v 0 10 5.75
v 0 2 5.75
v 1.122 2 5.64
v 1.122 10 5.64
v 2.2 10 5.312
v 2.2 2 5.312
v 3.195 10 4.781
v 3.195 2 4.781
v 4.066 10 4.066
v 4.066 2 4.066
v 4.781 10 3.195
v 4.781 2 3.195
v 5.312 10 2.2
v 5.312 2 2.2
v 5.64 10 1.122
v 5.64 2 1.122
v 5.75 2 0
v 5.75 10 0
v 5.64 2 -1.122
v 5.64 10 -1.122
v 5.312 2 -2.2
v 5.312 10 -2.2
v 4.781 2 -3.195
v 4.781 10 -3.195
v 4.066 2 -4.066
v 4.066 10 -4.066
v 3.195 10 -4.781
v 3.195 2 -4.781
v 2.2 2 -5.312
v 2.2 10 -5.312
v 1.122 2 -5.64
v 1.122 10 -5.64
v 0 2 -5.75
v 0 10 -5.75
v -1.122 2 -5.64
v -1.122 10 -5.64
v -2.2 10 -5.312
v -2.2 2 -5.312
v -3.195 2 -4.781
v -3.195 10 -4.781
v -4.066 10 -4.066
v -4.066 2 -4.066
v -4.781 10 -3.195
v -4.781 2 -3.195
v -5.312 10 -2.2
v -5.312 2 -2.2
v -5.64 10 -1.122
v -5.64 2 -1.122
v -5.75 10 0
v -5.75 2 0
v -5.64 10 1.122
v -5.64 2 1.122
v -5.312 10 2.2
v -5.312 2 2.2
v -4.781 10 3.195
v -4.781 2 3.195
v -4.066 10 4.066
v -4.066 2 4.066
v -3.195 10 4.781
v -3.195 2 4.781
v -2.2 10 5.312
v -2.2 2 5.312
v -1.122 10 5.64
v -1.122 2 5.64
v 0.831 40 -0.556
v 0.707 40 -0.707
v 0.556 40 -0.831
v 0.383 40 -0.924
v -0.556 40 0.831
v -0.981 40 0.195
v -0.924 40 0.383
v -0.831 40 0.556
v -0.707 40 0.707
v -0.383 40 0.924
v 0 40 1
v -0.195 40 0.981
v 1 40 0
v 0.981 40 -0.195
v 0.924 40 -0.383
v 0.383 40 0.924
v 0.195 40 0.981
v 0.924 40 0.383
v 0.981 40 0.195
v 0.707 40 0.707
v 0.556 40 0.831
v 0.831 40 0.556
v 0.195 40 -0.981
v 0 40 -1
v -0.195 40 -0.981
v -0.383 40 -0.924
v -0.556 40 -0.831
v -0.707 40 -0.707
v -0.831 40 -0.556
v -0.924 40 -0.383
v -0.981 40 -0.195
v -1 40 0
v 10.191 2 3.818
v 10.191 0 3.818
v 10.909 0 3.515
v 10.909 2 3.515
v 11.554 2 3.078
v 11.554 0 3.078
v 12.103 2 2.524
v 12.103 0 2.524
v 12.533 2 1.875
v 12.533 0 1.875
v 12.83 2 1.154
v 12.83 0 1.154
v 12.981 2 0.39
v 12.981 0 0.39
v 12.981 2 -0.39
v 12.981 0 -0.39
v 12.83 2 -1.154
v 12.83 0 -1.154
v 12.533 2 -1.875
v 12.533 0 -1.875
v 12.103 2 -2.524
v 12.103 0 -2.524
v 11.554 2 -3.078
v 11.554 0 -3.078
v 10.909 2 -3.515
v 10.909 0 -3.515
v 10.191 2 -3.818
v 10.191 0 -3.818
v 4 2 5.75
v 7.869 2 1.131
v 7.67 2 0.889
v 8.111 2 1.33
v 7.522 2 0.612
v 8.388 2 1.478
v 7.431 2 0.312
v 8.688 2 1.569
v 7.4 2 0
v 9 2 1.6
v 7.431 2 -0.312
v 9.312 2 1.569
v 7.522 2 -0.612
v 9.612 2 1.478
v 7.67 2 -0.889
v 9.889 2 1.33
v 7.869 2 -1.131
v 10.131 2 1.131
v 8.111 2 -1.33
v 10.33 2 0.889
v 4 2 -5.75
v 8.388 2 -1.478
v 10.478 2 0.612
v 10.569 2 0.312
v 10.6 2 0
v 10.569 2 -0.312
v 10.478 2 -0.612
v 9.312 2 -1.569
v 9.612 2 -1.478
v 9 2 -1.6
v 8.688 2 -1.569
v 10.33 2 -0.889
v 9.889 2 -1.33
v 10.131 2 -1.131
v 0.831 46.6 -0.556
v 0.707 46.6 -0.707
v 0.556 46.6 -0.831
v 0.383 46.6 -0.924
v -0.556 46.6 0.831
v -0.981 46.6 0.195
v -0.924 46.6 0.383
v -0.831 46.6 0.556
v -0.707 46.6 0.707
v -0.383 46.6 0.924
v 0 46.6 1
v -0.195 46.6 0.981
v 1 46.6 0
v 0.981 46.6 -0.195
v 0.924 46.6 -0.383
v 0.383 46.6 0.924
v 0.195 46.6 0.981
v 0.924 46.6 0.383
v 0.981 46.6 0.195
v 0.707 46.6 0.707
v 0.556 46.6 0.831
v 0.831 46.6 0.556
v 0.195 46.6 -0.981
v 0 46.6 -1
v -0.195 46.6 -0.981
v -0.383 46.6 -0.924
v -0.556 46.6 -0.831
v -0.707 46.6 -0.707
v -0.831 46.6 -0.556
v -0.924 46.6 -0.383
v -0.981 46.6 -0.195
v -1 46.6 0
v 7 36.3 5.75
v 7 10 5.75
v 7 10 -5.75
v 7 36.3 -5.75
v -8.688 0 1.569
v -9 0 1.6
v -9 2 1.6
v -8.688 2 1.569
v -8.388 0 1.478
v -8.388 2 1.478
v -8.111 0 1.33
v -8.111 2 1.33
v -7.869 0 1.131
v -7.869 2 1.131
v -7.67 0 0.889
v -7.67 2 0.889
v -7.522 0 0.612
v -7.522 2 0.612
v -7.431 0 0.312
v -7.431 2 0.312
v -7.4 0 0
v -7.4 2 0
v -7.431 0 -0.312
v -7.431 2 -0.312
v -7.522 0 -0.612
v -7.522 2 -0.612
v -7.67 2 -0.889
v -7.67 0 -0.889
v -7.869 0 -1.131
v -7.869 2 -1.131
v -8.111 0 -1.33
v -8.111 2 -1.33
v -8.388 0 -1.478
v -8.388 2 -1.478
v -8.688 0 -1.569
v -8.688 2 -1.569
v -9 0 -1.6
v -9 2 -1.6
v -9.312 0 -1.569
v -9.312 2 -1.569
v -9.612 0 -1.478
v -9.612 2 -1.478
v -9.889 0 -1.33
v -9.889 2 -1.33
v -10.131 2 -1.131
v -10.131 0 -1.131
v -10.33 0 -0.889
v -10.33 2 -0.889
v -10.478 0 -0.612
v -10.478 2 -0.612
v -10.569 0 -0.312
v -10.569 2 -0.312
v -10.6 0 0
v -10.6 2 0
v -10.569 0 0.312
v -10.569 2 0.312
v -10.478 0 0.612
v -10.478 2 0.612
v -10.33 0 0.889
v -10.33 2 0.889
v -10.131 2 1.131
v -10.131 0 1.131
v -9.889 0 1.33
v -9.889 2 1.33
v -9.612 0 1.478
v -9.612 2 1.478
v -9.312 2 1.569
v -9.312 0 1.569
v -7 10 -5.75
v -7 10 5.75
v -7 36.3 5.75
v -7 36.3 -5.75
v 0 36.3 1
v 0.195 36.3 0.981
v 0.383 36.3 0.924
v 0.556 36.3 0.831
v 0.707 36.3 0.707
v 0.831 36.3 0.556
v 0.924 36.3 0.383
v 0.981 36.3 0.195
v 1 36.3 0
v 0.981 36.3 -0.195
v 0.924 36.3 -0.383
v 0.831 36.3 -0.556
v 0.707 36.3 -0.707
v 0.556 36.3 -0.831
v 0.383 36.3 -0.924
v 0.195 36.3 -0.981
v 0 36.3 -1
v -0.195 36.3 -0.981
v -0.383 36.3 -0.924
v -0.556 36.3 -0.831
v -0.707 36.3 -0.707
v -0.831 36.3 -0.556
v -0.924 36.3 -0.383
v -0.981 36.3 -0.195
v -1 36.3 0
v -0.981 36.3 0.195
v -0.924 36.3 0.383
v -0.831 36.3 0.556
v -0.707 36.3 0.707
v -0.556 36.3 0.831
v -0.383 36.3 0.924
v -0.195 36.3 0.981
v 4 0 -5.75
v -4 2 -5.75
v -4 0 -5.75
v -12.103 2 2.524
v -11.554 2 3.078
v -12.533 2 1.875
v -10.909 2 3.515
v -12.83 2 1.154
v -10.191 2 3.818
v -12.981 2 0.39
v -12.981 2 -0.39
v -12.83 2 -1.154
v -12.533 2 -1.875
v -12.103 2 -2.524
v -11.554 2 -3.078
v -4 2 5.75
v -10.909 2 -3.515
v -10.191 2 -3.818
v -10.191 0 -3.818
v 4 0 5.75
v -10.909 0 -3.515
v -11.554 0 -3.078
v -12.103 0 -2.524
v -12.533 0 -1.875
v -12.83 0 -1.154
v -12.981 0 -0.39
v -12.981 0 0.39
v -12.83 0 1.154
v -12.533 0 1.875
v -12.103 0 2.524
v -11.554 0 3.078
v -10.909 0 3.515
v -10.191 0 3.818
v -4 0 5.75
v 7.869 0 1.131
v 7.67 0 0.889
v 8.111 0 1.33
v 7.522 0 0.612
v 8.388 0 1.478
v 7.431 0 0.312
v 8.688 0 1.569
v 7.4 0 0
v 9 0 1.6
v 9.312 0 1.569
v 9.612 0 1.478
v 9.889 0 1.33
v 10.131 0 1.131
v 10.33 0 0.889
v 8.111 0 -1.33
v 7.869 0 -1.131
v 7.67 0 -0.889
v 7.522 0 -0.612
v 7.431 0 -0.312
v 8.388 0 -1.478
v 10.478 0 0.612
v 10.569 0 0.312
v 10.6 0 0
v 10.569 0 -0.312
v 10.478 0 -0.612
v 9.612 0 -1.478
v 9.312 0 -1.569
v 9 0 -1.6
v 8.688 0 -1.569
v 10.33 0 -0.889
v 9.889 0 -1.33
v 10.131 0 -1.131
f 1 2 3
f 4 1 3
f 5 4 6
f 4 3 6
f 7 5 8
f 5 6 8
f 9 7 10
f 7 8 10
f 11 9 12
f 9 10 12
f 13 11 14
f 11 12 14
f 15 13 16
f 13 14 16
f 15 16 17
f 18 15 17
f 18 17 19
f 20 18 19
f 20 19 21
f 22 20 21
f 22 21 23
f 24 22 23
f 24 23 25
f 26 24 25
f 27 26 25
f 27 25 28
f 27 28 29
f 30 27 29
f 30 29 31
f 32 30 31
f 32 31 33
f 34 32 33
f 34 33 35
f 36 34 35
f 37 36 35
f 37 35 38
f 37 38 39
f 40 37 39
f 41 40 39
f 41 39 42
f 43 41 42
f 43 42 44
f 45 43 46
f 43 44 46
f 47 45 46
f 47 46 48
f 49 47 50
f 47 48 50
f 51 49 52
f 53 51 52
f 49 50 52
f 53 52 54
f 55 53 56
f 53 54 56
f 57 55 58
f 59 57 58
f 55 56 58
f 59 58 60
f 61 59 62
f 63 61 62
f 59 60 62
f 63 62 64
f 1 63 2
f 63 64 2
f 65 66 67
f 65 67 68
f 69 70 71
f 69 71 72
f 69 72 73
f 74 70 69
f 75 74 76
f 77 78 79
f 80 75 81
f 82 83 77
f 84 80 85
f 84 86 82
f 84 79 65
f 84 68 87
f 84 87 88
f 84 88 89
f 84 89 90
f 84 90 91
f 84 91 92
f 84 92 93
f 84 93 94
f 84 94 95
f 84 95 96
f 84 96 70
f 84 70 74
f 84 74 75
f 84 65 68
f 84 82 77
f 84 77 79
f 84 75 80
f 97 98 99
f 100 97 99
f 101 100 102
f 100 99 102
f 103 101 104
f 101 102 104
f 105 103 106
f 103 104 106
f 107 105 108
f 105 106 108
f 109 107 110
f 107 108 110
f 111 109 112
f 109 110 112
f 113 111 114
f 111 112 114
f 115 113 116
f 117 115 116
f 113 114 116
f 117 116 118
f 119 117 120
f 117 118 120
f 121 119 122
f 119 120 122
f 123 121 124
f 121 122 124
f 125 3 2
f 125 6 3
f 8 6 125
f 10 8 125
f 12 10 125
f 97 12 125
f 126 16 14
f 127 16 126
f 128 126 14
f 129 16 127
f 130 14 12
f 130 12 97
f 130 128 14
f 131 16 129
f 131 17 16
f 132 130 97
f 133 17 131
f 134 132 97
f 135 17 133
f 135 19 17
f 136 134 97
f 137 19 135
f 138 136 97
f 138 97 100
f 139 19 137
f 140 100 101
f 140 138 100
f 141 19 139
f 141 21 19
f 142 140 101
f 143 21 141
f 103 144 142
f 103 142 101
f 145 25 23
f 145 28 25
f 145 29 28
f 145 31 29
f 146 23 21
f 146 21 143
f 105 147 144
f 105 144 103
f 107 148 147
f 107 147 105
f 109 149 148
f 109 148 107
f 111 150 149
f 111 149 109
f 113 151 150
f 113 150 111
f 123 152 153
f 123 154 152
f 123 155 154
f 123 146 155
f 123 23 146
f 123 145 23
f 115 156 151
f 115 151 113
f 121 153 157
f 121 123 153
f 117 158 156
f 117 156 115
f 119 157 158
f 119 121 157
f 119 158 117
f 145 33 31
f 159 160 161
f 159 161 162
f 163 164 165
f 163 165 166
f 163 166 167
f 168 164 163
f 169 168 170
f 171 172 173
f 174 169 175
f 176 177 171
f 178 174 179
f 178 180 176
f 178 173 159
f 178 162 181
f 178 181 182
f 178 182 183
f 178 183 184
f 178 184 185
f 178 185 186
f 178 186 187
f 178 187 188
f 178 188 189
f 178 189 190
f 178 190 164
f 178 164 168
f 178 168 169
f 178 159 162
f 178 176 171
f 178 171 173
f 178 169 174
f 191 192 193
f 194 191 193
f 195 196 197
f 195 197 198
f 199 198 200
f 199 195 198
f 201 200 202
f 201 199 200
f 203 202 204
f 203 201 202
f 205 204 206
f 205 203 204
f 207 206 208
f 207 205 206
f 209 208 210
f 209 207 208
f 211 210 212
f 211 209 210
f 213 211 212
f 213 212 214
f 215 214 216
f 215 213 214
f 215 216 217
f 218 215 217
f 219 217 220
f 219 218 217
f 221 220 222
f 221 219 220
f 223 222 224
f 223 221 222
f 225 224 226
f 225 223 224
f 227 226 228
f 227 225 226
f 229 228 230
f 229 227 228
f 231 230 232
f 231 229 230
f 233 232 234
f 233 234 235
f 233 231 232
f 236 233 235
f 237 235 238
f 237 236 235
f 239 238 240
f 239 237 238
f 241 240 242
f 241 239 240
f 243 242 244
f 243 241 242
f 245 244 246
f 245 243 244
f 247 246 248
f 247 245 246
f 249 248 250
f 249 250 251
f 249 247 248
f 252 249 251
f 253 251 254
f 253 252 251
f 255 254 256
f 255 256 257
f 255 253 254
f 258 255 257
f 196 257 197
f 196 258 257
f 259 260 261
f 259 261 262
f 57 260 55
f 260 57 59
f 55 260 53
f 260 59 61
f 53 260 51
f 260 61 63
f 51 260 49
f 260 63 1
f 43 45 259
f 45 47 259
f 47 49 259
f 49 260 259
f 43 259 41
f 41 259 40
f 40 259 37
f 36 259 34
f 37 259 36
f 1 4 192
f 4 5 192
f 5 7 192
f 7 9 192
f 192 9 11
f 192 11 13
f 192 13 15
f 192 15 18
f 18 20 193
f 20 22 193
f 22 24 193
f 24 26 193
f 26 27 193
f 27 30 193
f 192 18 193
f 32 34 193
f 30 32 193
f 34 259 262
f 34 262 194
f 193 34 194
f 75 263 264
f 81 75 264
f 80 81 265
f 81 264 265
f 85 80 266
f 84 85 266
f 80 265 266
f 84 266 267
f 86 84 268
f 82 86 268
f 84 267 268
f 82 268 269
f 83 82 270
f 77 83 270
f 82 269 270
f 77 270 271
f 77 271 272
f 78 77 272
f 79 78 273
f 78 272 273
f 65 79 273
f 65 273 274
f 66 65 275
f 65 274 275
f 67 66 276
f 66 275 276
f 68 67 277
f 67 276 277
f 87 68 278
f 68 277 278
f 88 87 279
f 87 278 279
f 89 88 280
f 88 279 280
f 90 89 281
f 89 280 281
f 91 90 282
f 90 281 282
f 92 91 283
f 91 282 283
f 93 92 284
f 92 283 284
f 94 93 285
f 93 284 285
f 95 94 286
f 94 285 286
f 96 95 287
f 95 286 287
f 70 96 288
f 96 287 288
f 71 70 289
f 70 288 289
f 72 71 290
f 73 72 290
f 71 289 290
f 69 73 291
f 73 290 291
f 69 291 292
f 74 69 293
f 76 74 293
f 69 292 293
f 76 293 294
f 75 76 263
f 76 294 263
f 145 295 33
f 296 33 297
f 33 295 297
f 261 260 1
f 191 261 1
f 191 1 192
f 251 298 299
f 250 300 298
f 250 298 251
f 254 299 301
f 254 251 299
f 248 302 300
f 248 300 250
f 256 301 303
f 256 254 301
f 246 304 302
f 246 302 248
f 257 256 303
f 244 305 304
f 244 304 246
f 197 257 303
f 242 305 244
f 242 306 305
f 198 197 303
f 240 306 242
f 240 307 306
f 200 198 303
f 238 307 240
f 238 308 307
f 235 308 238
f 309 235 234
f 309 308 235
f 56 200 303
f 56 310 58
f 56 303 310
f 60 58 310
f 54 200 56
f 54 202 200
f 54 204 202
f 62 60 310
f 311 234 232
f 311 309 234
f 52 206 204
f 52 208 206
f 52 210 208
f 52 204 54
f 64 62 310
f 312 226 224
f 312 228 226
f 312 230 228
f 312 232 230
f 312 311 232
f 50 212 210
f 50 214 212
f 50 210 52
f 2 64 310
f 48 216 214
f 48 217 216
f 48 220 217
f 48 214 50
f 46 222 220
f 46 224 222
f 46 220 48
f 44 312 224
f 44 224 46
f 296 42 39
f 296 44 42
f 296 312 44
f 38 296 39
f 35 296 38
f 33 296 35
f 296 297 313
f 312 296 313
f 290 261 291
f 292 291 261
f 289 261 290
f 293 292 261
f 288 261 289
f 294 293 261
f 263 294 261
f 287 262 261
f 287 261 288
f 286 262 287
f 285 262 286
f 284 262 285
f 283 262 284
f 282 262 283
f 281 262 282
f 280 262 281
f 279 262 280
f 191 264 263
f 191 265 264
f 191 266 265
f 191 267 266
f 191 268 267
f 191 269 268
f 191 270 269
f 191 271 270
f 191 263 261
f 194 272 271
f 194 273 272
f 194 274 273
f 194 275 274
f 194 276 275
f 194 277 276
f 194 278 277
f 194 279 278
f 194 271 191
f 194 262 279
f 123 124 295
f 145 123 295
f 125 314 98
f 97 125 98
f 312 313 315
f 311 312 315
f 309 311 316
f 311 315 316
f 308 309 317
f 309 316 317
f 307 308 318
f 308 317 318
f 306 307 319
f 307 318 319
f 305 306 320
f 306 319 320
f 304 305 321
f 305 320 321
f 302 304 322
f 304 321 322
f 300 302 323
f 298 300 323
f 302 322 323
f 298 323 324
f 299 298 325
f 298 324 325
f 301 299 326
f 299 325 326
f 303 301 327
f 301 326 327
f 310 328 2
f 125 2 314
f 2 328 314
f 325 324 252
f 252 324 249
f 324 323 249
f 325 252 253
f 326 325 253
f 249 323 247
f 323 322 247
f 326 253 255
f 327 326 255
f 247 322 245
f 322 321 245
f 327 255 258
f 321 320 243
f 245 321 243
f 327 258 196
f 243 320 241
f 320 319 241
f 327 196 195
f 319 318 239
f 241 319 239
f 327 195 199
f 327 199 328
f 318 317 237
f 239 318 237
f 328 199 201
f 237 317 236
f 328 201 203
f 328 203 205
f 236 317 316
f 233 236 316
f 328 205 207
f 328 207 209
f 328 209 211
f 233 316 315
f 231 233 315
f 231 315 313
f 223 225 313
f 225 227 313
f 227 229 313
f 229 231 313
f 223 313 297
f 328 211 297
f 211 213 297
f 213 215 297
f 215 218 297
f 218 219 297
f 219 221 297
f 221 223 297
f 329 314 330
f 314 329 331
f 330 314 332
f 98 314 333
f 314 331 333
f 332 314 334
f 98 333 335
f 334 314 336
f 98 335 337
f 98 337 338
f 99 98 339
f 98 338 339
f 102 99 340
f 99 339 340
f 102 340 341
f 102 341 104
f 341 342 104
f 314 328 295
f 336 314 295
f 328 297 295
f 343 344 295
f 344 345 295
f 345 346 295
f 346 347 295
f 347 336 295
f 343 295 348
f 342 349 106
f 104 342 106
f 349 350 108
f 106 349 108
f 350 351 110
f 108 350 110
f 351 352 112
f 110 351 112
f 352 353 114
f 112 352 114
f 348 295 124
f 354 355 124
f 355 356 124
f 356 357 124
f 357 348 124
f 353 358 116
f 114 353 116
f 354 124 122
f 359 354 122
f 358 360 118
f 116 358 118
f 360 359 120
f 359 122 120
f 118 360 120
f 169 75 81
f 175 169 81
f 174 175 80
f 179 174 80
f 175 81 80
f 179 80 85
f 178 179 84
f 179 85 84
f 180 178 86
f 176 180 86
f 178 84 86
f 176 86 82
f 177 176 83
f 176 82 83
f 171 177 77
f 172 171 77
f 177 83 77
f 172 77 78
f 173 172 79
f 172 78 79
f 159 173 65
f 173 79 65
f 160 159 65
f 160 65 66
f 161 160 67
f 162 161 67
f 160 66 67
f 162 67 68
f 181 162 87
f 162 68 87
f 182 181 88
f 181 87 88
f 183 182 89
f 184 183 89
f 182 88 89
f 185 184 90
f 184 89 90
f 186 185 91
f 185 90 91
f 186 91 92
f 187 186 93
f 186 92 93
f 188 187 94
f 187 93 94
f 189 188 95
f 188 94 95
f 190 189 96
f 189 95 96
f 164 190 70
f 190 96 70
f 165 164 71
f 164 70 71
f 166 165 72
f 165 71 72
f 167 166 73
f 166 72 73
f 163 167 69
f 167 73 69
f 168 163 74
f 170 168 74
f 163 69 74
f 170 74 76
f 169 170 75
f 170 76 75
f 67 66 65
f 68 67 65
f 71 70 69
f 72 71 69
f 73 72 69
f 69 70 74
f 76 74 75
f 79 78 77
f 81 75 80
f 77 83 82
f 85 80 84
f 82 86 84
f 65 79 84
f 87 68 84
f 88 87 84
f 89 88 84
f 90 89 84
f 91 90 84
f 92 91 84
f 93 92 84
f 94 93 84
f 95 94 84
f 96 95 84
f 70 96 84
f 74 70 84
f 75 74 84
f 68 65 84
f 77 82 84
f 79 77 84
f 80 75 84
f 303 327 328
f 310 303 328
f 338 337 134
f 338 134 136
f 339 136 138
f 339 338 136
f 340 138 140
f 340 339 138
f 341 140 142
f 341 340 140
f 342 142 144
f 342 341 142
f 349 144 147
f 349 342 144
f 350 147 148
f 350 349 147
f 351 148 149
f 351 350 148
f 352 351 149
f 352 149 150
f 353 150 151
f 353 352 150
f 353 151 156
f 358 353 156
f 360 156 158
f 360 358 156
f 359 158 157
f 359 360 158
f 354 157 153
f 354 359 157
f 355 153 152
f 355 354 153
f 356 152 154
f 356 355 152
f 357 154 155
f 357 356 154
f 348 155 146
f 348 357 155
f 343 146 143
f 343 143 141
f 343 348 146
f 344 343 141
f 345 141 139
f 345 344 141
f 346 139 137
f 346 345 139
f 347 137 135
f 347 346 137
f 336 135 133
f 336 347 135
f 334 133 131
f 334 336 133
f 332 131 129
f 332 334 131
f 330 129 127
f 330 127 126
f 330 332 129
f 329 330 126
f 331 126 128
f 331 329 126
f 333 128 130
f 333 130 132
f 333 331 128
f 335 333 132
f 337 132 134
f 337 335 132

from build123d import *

# Parameters (mm, degrees)
SKETCH1_R           = 1.6
BOSS_EXTRUDE1_DEPTH = 2
SKETCH2_R           = 5.75
BOSS_EXTRUDE2_DEPTH = 8
SKETCH3_W           = 14
SKETCH3_H           = 11.5
BOSS_EXTRUDE3_DEPTH = 26.3
SKETCH4_R           = 1
BOSS_EXTRUDE4_DEPTH = 3.7
BOSS_EXTRUDE5_START = 3.7
SKETCH4_2_R         = 1
BOSS_EXTRUDE5_DEPTH = 6.6


with BuildPart() as part:
    # Sketch1 → Boss-Extrude1 (new body)
    # profile 1 of 3: a face of its own
    with BuildSketch(Plane(origin=(0, 0, 0), x_dir=(1, 0, 0), z_dir=(0, 1, 0))):
        with BuildLine():
            Line((-9, -4), (9, -4))
            ThreePointArc((9, -4), (13, 0), (9, 4))
            Line((9, 4), (-9, 4))
            ThreePointArc((-9, 4), (-13, 0), (-9, -4))
        make_face()
        with Locations(Location((-9, 0, 0), (0, 0, 270))):
            Circle(SKETCH1_R, mode=Mode.SUBTRACT)
        with Locations(Location((9, 0, 0), (0, 0, 270))):
            Circle(SKETCH1_R, mode=Mode.SUBTRACT)
    # profile 2 of 3: a face of its own
    with BuildSketch(Plane(origin=(0, 0, 0), x_dir=(1, 0, 0), z_dir=(0, 1, 0))):
        with BuildLine():
            ThreePointArc((-10.191266314, 3.818492447), (-9.602507349, 3.954362767), (-9, 4))
            Line((-9, 4), (9, 4))
            ThreePointArc((9, 4), (9.602507349, 3.954362767), (10.191266314, 3.818492447))
            Line((10.191266314, 3.818492447), (4, 5.75))
            Line((4, 5.75), (-4, 5.75))
            Line((-4, 5.75), (-10.191266314, 3.818492447))
        make_face()
    # profile 3 of 3: a face of its own
    with BuildSketch(Plane(origin=(0, 0, 0), x_dir=(1, 0, 0), z_dir=(0, 1, 0))):
        with BuildLine():
            ThreePointArc((-9, -4), (-9.602507349, -3.954362767), (-10.191266314, -3.818492447))
            Line((-10.191266314, -3.818492447), (-4, -5.75))
            Line((-4, -5.75), (4, -5.75))
            Line((4, -5.75), (10.191266314, -3.818492447))
            ThreePointArc((10.191266314, -3.818492447), (9.602507349, -3.954362767), (9, -4))
            Line((9, -4), (-9, -4))
        make_face()
    extrude(amount=BOSS_EXTRUDE1_DEPTH)

    # Sketch2 → Boss-Extrude2 (add)
    with BuildSketch(Plane(origin=(0, 2, 0), x_dir=(1, 0, 0), z_dir=(0, 1, 0))):
        with Locations(Location((0, 0, 0), (0, 0, 270))):
            Circle(SKETCH2_R)
    extrude(amount=BOSS_EXTRUDE2_DEPTH)

    # Sketch3 → Boss-Extrude3 (add)
    with BuildSketch(Plane(origin=(0, 10, 0), x_dir=(1, 0, 0), z_dir=(0, 1, 0))):
        Rectangle(SKETCH3_W, SKETCH3_H)
    extrude(amount=BOSS_EXTRUDE3_DEPTH)

    # Sketch4 → Boss-Extrude4 (add)
    with BuildSketch(Plane(origin=(0, 36.3, 0), x_dir=(1, 0, 0), z_dir=(0, 1, 0))):
        with Locations(Location((0, 0, 0), (0, 0, 270))):
            Circle(SKETCH4_R)
    extrude(amount=BOSS_EXTRUDE4_DEPTH)


with BuildPart() as body_2:
    # Sketch4<2> → Boss-Extrude5 (new body)
    with BuildSketch(Plane(origin=(0, 36.3, 0), x_dir=(1, 0, 0), z_dir=(0, 1, 0)).offset(BOSS_EXTRUDE5_START)):
        with Locations(Location((0, 0, 0), (0, 0, 270))):
            Circle(SKETCH4_2_R)
    extrude(amount=BOSS_EXTRUDE5_DEPTH)


solid = Compound([part.part, body_2.part])
